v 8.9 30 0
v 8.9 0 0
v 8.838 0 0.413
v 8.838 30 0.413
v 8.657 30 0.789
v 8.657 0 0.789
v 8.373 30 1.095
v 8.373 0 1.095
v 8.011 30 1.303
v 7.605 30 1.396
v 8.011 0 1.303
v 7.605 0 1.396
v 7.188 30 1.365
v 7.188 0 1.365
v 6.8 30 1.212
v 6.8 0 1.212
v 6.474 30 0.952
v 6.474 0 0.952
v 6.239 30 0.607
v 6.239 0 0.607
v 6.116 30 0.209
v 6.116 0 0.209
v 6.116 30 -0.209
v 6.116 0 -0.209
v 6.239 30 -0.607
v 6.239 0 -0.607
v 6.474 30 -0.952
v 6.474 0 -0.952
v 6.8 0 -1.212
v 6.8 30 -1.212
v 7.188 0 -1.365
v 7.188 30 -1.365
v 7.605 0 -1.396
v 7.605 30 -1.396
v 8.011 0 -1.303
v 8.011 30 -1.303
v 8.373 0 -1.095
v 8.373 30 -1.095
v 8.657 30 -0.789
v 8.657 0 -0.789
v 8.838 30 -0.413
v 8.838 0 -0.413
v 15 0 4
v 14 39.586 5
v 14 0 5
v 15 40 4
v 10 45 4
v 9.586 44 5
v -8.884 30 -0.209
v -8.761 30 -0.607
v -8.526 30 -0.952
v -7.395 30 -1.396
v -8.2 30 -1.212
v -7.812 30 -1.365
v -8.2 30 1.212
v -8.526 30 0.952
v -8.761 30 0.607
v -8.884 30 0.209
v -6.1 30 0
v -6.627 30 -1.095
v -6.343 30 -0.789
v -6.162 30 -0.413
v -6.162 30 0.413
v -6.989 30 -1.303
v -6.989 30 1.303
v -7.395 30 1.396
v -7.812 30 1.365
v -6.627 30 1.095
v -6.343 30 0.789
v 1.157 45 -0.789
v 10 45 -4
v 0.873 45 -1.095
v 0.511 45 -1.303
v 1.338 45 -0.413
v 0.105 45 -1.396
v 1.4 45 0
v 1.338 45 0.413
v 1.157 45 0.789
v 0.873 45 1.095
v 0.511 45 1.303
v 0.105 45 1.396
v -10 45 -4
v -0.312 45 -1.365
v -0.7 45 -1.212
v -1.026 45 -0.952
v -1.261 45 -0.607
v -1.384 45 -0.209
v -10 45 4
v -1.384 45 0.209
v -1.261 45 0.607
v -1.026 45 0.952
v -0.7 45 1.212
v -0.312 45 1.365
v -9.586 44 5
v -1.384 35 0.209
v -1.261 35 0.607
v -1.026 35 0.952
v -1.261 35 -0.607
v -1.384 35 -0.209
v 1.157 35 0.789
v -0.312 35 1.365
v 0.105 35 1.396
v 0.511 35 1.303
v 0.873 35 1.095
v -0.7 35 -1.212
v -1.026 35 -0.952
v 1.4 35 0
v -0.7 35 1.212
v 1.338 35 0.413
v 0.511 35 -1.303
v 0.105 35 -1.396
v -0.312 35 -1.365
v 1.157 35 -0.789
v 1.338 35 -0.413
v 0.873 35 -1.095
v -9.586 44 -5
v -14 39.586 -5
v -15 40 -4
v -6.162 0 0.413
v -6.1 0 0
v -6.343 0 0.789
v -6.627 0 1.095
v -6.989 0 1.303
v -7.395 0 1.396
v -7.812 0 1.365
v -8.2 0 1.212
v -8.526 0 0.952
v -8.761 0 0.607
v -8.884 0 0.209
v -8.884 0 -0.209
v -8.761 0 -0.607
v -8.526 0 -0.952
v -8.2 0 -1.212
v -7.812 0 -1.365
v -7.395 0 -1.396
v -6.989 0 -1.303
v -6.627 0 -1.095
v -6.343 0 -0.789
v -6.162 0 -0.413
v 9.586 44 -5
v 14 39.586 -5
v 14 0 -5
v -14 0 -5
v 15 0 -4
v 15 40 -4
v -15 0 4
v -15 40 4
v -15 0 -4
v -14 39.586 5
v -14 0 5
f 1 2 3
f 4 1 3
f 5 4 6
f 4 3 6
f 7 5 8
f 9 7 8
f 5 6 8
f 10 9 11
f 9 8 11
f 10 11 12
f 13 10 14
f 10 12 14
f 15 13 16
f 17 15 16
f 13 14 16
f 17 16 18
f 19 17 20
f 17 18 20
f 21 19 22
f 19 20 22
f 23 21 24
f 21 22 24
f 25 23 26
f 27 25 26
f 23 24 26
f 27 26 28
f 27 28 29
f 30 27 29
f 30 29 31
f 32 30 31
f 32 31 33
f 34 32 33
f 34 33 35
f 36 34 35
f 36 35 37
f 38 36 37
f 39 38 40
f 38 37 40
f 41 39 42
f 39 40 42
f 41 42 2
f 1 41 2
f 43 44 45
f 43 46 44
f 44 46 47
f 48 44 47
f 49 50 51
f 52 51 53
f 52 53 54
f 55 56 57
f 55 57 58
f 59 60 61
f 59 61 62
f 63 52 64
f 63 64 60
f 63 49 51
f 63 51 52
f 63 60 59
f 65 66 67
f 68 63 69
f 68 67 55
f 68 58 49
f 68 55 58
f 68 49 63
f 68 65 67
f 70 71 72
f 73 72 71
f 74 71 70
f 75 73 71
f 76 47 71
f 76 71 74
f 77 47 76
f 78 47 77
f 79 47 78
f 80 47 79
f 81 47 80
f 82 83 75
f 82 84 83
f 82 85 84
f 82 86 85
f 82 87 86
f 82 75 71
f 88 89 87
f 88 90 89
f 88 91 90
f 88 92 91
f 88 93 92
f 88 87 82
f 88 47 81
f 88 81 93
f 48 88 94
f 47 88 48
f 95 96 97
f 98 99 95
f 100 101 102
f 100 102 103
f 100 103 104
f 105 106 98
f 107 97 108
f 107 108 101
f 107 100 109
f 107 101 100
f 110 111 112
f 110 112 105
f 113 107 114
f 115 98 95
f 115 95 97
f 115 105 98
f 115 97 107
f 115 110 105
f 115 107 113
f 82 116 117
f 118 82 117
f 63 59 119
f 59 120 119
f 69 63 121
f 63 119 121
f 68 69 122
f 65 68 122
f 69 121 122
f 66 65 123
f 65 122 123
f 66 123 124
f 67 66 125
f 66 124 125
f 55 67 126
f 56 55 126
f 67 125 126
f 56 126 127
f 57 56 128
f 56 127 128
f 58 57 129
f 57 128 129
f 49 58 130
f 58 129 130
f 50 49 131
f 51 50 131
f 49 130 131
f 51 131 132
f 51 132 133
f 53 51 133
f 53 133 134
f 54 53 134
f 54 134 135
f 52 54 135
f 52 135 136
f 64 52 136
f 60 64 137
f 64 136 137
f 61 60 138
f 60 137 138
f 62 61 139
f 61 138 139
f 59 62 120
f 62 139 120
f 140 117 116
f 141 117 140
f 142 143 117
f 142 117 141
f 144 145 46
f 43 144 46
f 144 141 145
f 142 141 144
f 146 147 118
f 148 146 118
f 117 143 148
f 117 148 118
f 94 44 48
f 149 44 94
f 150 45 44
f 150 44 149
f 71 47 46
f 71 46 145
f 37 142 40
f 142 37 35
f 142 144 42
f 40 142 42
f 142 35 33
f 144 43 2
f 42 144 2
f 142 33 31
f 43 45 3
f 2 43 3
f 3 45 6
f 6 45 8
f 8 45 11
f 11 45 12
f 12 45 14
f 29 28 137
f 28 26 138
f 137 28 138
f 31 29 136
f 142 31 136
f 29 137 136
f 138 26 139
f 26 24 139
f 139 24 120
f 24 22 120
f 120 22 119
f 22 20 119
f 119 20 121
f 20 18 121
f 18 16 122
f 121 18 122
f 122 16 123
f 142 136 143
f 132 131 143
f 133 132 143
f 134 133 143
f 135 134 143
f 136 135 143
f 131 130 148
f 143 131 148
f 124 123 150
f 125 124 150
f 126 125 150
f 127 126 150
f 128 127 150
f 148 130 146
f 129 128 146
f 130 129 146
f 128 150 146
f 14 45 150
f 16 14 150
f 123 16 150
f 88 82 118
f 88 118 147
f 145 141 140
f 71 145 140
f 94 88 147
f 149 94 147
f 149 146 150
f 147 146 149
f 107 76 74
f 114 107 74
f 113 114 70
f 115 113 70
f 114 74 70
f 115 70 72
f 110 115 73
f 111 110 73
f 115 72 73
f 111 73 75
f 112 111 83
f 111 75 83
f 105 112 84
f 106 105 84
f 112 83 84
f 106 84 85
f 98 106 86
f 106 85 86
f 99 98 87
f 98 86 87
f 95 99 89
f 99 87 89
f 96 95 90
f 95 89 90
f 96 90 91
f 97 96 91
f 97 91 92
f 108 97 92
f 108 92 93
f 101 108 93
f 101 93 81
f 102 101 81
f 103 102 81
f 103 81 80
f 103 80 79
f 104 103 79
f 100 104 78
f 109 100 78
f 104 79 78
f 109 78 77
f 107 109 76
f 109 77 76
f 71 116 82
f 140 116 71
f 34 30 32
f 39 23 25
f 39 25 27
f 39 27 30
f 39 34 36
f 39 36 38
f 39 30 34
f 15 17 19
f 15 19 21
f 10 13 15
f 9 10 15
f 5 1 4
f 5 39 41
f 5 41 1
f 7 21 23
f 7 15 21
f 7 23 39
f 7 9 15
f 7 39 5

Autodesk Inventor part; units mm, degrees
ref_plane "YZ Plane" through (0, 0, 0) normal (1, 0, 0) x (0, 1, 0)
ref_plane "XZ Plane" through (0, 0, 0) normal (0, 1, 0) x (-1, 0, 0)
ref_plane "XY Plane" through (0, 0, 0) normal (0, 0, 1) x (1, 0, 0)
sketch "Sketch1" plane through (0, 0, 0) normal (0, 1, 0) x (-1, 0, 0)
  line L0 (-15, 5) -> (15, 5)
  line L1 (15, 5) -> (15, -5)
  line L2 (15, -5) -> (-15, -5)
  line L3 (-15, -5) -> (-15, 5)
  dimension "d0" = 30
  dimension "d1" = 10
extrude "Extrusion1" add sketch "Sketch1" along normal blind 45
sketch "Sketch2" plane through (0, 0, 0) normal (0, -1, 0) x (1, 0, 0)
  circle A0 centre (7.5, 0) radius 1.4
  circle A1 centre (-7.5, 0) radius 1.4
  point P0 (0, 0)
  dimension "d11" = 2.8
  dimension "d12" = 2.8
extrude "Extrusion2" cut sketch "Sketch2" against normal blind 30
sketch "Sketch4" plane through (0, 45, 0) normal (0, 1, 0) x (1, 0, 0)
  circle A0 centre (0, 0) radius 1.4
  dimension "d15" = 2.8
extrude "Extrusion3" cut sketch "Sketch4" against normal blind 10
chamfer "Chamfer1" distance 5 angle 45 2 edges at (15, 45, 0) (-15, 45, 0)
chamfer "Chamfer2" distance 1 angle 45 10 edges at (15, 20, -5) (12.5, 42.5, -5) (0, 45, -5) (-12.5, 42.5, -5) (-15, 20, -5) (-15, 20, 5) (-12.5, 42.5, 5) (0, 45, 5) (12.5, 42.5, 5) (15, 20, 5)
properties part number "Side Suppor" material "ABS Plastic"
